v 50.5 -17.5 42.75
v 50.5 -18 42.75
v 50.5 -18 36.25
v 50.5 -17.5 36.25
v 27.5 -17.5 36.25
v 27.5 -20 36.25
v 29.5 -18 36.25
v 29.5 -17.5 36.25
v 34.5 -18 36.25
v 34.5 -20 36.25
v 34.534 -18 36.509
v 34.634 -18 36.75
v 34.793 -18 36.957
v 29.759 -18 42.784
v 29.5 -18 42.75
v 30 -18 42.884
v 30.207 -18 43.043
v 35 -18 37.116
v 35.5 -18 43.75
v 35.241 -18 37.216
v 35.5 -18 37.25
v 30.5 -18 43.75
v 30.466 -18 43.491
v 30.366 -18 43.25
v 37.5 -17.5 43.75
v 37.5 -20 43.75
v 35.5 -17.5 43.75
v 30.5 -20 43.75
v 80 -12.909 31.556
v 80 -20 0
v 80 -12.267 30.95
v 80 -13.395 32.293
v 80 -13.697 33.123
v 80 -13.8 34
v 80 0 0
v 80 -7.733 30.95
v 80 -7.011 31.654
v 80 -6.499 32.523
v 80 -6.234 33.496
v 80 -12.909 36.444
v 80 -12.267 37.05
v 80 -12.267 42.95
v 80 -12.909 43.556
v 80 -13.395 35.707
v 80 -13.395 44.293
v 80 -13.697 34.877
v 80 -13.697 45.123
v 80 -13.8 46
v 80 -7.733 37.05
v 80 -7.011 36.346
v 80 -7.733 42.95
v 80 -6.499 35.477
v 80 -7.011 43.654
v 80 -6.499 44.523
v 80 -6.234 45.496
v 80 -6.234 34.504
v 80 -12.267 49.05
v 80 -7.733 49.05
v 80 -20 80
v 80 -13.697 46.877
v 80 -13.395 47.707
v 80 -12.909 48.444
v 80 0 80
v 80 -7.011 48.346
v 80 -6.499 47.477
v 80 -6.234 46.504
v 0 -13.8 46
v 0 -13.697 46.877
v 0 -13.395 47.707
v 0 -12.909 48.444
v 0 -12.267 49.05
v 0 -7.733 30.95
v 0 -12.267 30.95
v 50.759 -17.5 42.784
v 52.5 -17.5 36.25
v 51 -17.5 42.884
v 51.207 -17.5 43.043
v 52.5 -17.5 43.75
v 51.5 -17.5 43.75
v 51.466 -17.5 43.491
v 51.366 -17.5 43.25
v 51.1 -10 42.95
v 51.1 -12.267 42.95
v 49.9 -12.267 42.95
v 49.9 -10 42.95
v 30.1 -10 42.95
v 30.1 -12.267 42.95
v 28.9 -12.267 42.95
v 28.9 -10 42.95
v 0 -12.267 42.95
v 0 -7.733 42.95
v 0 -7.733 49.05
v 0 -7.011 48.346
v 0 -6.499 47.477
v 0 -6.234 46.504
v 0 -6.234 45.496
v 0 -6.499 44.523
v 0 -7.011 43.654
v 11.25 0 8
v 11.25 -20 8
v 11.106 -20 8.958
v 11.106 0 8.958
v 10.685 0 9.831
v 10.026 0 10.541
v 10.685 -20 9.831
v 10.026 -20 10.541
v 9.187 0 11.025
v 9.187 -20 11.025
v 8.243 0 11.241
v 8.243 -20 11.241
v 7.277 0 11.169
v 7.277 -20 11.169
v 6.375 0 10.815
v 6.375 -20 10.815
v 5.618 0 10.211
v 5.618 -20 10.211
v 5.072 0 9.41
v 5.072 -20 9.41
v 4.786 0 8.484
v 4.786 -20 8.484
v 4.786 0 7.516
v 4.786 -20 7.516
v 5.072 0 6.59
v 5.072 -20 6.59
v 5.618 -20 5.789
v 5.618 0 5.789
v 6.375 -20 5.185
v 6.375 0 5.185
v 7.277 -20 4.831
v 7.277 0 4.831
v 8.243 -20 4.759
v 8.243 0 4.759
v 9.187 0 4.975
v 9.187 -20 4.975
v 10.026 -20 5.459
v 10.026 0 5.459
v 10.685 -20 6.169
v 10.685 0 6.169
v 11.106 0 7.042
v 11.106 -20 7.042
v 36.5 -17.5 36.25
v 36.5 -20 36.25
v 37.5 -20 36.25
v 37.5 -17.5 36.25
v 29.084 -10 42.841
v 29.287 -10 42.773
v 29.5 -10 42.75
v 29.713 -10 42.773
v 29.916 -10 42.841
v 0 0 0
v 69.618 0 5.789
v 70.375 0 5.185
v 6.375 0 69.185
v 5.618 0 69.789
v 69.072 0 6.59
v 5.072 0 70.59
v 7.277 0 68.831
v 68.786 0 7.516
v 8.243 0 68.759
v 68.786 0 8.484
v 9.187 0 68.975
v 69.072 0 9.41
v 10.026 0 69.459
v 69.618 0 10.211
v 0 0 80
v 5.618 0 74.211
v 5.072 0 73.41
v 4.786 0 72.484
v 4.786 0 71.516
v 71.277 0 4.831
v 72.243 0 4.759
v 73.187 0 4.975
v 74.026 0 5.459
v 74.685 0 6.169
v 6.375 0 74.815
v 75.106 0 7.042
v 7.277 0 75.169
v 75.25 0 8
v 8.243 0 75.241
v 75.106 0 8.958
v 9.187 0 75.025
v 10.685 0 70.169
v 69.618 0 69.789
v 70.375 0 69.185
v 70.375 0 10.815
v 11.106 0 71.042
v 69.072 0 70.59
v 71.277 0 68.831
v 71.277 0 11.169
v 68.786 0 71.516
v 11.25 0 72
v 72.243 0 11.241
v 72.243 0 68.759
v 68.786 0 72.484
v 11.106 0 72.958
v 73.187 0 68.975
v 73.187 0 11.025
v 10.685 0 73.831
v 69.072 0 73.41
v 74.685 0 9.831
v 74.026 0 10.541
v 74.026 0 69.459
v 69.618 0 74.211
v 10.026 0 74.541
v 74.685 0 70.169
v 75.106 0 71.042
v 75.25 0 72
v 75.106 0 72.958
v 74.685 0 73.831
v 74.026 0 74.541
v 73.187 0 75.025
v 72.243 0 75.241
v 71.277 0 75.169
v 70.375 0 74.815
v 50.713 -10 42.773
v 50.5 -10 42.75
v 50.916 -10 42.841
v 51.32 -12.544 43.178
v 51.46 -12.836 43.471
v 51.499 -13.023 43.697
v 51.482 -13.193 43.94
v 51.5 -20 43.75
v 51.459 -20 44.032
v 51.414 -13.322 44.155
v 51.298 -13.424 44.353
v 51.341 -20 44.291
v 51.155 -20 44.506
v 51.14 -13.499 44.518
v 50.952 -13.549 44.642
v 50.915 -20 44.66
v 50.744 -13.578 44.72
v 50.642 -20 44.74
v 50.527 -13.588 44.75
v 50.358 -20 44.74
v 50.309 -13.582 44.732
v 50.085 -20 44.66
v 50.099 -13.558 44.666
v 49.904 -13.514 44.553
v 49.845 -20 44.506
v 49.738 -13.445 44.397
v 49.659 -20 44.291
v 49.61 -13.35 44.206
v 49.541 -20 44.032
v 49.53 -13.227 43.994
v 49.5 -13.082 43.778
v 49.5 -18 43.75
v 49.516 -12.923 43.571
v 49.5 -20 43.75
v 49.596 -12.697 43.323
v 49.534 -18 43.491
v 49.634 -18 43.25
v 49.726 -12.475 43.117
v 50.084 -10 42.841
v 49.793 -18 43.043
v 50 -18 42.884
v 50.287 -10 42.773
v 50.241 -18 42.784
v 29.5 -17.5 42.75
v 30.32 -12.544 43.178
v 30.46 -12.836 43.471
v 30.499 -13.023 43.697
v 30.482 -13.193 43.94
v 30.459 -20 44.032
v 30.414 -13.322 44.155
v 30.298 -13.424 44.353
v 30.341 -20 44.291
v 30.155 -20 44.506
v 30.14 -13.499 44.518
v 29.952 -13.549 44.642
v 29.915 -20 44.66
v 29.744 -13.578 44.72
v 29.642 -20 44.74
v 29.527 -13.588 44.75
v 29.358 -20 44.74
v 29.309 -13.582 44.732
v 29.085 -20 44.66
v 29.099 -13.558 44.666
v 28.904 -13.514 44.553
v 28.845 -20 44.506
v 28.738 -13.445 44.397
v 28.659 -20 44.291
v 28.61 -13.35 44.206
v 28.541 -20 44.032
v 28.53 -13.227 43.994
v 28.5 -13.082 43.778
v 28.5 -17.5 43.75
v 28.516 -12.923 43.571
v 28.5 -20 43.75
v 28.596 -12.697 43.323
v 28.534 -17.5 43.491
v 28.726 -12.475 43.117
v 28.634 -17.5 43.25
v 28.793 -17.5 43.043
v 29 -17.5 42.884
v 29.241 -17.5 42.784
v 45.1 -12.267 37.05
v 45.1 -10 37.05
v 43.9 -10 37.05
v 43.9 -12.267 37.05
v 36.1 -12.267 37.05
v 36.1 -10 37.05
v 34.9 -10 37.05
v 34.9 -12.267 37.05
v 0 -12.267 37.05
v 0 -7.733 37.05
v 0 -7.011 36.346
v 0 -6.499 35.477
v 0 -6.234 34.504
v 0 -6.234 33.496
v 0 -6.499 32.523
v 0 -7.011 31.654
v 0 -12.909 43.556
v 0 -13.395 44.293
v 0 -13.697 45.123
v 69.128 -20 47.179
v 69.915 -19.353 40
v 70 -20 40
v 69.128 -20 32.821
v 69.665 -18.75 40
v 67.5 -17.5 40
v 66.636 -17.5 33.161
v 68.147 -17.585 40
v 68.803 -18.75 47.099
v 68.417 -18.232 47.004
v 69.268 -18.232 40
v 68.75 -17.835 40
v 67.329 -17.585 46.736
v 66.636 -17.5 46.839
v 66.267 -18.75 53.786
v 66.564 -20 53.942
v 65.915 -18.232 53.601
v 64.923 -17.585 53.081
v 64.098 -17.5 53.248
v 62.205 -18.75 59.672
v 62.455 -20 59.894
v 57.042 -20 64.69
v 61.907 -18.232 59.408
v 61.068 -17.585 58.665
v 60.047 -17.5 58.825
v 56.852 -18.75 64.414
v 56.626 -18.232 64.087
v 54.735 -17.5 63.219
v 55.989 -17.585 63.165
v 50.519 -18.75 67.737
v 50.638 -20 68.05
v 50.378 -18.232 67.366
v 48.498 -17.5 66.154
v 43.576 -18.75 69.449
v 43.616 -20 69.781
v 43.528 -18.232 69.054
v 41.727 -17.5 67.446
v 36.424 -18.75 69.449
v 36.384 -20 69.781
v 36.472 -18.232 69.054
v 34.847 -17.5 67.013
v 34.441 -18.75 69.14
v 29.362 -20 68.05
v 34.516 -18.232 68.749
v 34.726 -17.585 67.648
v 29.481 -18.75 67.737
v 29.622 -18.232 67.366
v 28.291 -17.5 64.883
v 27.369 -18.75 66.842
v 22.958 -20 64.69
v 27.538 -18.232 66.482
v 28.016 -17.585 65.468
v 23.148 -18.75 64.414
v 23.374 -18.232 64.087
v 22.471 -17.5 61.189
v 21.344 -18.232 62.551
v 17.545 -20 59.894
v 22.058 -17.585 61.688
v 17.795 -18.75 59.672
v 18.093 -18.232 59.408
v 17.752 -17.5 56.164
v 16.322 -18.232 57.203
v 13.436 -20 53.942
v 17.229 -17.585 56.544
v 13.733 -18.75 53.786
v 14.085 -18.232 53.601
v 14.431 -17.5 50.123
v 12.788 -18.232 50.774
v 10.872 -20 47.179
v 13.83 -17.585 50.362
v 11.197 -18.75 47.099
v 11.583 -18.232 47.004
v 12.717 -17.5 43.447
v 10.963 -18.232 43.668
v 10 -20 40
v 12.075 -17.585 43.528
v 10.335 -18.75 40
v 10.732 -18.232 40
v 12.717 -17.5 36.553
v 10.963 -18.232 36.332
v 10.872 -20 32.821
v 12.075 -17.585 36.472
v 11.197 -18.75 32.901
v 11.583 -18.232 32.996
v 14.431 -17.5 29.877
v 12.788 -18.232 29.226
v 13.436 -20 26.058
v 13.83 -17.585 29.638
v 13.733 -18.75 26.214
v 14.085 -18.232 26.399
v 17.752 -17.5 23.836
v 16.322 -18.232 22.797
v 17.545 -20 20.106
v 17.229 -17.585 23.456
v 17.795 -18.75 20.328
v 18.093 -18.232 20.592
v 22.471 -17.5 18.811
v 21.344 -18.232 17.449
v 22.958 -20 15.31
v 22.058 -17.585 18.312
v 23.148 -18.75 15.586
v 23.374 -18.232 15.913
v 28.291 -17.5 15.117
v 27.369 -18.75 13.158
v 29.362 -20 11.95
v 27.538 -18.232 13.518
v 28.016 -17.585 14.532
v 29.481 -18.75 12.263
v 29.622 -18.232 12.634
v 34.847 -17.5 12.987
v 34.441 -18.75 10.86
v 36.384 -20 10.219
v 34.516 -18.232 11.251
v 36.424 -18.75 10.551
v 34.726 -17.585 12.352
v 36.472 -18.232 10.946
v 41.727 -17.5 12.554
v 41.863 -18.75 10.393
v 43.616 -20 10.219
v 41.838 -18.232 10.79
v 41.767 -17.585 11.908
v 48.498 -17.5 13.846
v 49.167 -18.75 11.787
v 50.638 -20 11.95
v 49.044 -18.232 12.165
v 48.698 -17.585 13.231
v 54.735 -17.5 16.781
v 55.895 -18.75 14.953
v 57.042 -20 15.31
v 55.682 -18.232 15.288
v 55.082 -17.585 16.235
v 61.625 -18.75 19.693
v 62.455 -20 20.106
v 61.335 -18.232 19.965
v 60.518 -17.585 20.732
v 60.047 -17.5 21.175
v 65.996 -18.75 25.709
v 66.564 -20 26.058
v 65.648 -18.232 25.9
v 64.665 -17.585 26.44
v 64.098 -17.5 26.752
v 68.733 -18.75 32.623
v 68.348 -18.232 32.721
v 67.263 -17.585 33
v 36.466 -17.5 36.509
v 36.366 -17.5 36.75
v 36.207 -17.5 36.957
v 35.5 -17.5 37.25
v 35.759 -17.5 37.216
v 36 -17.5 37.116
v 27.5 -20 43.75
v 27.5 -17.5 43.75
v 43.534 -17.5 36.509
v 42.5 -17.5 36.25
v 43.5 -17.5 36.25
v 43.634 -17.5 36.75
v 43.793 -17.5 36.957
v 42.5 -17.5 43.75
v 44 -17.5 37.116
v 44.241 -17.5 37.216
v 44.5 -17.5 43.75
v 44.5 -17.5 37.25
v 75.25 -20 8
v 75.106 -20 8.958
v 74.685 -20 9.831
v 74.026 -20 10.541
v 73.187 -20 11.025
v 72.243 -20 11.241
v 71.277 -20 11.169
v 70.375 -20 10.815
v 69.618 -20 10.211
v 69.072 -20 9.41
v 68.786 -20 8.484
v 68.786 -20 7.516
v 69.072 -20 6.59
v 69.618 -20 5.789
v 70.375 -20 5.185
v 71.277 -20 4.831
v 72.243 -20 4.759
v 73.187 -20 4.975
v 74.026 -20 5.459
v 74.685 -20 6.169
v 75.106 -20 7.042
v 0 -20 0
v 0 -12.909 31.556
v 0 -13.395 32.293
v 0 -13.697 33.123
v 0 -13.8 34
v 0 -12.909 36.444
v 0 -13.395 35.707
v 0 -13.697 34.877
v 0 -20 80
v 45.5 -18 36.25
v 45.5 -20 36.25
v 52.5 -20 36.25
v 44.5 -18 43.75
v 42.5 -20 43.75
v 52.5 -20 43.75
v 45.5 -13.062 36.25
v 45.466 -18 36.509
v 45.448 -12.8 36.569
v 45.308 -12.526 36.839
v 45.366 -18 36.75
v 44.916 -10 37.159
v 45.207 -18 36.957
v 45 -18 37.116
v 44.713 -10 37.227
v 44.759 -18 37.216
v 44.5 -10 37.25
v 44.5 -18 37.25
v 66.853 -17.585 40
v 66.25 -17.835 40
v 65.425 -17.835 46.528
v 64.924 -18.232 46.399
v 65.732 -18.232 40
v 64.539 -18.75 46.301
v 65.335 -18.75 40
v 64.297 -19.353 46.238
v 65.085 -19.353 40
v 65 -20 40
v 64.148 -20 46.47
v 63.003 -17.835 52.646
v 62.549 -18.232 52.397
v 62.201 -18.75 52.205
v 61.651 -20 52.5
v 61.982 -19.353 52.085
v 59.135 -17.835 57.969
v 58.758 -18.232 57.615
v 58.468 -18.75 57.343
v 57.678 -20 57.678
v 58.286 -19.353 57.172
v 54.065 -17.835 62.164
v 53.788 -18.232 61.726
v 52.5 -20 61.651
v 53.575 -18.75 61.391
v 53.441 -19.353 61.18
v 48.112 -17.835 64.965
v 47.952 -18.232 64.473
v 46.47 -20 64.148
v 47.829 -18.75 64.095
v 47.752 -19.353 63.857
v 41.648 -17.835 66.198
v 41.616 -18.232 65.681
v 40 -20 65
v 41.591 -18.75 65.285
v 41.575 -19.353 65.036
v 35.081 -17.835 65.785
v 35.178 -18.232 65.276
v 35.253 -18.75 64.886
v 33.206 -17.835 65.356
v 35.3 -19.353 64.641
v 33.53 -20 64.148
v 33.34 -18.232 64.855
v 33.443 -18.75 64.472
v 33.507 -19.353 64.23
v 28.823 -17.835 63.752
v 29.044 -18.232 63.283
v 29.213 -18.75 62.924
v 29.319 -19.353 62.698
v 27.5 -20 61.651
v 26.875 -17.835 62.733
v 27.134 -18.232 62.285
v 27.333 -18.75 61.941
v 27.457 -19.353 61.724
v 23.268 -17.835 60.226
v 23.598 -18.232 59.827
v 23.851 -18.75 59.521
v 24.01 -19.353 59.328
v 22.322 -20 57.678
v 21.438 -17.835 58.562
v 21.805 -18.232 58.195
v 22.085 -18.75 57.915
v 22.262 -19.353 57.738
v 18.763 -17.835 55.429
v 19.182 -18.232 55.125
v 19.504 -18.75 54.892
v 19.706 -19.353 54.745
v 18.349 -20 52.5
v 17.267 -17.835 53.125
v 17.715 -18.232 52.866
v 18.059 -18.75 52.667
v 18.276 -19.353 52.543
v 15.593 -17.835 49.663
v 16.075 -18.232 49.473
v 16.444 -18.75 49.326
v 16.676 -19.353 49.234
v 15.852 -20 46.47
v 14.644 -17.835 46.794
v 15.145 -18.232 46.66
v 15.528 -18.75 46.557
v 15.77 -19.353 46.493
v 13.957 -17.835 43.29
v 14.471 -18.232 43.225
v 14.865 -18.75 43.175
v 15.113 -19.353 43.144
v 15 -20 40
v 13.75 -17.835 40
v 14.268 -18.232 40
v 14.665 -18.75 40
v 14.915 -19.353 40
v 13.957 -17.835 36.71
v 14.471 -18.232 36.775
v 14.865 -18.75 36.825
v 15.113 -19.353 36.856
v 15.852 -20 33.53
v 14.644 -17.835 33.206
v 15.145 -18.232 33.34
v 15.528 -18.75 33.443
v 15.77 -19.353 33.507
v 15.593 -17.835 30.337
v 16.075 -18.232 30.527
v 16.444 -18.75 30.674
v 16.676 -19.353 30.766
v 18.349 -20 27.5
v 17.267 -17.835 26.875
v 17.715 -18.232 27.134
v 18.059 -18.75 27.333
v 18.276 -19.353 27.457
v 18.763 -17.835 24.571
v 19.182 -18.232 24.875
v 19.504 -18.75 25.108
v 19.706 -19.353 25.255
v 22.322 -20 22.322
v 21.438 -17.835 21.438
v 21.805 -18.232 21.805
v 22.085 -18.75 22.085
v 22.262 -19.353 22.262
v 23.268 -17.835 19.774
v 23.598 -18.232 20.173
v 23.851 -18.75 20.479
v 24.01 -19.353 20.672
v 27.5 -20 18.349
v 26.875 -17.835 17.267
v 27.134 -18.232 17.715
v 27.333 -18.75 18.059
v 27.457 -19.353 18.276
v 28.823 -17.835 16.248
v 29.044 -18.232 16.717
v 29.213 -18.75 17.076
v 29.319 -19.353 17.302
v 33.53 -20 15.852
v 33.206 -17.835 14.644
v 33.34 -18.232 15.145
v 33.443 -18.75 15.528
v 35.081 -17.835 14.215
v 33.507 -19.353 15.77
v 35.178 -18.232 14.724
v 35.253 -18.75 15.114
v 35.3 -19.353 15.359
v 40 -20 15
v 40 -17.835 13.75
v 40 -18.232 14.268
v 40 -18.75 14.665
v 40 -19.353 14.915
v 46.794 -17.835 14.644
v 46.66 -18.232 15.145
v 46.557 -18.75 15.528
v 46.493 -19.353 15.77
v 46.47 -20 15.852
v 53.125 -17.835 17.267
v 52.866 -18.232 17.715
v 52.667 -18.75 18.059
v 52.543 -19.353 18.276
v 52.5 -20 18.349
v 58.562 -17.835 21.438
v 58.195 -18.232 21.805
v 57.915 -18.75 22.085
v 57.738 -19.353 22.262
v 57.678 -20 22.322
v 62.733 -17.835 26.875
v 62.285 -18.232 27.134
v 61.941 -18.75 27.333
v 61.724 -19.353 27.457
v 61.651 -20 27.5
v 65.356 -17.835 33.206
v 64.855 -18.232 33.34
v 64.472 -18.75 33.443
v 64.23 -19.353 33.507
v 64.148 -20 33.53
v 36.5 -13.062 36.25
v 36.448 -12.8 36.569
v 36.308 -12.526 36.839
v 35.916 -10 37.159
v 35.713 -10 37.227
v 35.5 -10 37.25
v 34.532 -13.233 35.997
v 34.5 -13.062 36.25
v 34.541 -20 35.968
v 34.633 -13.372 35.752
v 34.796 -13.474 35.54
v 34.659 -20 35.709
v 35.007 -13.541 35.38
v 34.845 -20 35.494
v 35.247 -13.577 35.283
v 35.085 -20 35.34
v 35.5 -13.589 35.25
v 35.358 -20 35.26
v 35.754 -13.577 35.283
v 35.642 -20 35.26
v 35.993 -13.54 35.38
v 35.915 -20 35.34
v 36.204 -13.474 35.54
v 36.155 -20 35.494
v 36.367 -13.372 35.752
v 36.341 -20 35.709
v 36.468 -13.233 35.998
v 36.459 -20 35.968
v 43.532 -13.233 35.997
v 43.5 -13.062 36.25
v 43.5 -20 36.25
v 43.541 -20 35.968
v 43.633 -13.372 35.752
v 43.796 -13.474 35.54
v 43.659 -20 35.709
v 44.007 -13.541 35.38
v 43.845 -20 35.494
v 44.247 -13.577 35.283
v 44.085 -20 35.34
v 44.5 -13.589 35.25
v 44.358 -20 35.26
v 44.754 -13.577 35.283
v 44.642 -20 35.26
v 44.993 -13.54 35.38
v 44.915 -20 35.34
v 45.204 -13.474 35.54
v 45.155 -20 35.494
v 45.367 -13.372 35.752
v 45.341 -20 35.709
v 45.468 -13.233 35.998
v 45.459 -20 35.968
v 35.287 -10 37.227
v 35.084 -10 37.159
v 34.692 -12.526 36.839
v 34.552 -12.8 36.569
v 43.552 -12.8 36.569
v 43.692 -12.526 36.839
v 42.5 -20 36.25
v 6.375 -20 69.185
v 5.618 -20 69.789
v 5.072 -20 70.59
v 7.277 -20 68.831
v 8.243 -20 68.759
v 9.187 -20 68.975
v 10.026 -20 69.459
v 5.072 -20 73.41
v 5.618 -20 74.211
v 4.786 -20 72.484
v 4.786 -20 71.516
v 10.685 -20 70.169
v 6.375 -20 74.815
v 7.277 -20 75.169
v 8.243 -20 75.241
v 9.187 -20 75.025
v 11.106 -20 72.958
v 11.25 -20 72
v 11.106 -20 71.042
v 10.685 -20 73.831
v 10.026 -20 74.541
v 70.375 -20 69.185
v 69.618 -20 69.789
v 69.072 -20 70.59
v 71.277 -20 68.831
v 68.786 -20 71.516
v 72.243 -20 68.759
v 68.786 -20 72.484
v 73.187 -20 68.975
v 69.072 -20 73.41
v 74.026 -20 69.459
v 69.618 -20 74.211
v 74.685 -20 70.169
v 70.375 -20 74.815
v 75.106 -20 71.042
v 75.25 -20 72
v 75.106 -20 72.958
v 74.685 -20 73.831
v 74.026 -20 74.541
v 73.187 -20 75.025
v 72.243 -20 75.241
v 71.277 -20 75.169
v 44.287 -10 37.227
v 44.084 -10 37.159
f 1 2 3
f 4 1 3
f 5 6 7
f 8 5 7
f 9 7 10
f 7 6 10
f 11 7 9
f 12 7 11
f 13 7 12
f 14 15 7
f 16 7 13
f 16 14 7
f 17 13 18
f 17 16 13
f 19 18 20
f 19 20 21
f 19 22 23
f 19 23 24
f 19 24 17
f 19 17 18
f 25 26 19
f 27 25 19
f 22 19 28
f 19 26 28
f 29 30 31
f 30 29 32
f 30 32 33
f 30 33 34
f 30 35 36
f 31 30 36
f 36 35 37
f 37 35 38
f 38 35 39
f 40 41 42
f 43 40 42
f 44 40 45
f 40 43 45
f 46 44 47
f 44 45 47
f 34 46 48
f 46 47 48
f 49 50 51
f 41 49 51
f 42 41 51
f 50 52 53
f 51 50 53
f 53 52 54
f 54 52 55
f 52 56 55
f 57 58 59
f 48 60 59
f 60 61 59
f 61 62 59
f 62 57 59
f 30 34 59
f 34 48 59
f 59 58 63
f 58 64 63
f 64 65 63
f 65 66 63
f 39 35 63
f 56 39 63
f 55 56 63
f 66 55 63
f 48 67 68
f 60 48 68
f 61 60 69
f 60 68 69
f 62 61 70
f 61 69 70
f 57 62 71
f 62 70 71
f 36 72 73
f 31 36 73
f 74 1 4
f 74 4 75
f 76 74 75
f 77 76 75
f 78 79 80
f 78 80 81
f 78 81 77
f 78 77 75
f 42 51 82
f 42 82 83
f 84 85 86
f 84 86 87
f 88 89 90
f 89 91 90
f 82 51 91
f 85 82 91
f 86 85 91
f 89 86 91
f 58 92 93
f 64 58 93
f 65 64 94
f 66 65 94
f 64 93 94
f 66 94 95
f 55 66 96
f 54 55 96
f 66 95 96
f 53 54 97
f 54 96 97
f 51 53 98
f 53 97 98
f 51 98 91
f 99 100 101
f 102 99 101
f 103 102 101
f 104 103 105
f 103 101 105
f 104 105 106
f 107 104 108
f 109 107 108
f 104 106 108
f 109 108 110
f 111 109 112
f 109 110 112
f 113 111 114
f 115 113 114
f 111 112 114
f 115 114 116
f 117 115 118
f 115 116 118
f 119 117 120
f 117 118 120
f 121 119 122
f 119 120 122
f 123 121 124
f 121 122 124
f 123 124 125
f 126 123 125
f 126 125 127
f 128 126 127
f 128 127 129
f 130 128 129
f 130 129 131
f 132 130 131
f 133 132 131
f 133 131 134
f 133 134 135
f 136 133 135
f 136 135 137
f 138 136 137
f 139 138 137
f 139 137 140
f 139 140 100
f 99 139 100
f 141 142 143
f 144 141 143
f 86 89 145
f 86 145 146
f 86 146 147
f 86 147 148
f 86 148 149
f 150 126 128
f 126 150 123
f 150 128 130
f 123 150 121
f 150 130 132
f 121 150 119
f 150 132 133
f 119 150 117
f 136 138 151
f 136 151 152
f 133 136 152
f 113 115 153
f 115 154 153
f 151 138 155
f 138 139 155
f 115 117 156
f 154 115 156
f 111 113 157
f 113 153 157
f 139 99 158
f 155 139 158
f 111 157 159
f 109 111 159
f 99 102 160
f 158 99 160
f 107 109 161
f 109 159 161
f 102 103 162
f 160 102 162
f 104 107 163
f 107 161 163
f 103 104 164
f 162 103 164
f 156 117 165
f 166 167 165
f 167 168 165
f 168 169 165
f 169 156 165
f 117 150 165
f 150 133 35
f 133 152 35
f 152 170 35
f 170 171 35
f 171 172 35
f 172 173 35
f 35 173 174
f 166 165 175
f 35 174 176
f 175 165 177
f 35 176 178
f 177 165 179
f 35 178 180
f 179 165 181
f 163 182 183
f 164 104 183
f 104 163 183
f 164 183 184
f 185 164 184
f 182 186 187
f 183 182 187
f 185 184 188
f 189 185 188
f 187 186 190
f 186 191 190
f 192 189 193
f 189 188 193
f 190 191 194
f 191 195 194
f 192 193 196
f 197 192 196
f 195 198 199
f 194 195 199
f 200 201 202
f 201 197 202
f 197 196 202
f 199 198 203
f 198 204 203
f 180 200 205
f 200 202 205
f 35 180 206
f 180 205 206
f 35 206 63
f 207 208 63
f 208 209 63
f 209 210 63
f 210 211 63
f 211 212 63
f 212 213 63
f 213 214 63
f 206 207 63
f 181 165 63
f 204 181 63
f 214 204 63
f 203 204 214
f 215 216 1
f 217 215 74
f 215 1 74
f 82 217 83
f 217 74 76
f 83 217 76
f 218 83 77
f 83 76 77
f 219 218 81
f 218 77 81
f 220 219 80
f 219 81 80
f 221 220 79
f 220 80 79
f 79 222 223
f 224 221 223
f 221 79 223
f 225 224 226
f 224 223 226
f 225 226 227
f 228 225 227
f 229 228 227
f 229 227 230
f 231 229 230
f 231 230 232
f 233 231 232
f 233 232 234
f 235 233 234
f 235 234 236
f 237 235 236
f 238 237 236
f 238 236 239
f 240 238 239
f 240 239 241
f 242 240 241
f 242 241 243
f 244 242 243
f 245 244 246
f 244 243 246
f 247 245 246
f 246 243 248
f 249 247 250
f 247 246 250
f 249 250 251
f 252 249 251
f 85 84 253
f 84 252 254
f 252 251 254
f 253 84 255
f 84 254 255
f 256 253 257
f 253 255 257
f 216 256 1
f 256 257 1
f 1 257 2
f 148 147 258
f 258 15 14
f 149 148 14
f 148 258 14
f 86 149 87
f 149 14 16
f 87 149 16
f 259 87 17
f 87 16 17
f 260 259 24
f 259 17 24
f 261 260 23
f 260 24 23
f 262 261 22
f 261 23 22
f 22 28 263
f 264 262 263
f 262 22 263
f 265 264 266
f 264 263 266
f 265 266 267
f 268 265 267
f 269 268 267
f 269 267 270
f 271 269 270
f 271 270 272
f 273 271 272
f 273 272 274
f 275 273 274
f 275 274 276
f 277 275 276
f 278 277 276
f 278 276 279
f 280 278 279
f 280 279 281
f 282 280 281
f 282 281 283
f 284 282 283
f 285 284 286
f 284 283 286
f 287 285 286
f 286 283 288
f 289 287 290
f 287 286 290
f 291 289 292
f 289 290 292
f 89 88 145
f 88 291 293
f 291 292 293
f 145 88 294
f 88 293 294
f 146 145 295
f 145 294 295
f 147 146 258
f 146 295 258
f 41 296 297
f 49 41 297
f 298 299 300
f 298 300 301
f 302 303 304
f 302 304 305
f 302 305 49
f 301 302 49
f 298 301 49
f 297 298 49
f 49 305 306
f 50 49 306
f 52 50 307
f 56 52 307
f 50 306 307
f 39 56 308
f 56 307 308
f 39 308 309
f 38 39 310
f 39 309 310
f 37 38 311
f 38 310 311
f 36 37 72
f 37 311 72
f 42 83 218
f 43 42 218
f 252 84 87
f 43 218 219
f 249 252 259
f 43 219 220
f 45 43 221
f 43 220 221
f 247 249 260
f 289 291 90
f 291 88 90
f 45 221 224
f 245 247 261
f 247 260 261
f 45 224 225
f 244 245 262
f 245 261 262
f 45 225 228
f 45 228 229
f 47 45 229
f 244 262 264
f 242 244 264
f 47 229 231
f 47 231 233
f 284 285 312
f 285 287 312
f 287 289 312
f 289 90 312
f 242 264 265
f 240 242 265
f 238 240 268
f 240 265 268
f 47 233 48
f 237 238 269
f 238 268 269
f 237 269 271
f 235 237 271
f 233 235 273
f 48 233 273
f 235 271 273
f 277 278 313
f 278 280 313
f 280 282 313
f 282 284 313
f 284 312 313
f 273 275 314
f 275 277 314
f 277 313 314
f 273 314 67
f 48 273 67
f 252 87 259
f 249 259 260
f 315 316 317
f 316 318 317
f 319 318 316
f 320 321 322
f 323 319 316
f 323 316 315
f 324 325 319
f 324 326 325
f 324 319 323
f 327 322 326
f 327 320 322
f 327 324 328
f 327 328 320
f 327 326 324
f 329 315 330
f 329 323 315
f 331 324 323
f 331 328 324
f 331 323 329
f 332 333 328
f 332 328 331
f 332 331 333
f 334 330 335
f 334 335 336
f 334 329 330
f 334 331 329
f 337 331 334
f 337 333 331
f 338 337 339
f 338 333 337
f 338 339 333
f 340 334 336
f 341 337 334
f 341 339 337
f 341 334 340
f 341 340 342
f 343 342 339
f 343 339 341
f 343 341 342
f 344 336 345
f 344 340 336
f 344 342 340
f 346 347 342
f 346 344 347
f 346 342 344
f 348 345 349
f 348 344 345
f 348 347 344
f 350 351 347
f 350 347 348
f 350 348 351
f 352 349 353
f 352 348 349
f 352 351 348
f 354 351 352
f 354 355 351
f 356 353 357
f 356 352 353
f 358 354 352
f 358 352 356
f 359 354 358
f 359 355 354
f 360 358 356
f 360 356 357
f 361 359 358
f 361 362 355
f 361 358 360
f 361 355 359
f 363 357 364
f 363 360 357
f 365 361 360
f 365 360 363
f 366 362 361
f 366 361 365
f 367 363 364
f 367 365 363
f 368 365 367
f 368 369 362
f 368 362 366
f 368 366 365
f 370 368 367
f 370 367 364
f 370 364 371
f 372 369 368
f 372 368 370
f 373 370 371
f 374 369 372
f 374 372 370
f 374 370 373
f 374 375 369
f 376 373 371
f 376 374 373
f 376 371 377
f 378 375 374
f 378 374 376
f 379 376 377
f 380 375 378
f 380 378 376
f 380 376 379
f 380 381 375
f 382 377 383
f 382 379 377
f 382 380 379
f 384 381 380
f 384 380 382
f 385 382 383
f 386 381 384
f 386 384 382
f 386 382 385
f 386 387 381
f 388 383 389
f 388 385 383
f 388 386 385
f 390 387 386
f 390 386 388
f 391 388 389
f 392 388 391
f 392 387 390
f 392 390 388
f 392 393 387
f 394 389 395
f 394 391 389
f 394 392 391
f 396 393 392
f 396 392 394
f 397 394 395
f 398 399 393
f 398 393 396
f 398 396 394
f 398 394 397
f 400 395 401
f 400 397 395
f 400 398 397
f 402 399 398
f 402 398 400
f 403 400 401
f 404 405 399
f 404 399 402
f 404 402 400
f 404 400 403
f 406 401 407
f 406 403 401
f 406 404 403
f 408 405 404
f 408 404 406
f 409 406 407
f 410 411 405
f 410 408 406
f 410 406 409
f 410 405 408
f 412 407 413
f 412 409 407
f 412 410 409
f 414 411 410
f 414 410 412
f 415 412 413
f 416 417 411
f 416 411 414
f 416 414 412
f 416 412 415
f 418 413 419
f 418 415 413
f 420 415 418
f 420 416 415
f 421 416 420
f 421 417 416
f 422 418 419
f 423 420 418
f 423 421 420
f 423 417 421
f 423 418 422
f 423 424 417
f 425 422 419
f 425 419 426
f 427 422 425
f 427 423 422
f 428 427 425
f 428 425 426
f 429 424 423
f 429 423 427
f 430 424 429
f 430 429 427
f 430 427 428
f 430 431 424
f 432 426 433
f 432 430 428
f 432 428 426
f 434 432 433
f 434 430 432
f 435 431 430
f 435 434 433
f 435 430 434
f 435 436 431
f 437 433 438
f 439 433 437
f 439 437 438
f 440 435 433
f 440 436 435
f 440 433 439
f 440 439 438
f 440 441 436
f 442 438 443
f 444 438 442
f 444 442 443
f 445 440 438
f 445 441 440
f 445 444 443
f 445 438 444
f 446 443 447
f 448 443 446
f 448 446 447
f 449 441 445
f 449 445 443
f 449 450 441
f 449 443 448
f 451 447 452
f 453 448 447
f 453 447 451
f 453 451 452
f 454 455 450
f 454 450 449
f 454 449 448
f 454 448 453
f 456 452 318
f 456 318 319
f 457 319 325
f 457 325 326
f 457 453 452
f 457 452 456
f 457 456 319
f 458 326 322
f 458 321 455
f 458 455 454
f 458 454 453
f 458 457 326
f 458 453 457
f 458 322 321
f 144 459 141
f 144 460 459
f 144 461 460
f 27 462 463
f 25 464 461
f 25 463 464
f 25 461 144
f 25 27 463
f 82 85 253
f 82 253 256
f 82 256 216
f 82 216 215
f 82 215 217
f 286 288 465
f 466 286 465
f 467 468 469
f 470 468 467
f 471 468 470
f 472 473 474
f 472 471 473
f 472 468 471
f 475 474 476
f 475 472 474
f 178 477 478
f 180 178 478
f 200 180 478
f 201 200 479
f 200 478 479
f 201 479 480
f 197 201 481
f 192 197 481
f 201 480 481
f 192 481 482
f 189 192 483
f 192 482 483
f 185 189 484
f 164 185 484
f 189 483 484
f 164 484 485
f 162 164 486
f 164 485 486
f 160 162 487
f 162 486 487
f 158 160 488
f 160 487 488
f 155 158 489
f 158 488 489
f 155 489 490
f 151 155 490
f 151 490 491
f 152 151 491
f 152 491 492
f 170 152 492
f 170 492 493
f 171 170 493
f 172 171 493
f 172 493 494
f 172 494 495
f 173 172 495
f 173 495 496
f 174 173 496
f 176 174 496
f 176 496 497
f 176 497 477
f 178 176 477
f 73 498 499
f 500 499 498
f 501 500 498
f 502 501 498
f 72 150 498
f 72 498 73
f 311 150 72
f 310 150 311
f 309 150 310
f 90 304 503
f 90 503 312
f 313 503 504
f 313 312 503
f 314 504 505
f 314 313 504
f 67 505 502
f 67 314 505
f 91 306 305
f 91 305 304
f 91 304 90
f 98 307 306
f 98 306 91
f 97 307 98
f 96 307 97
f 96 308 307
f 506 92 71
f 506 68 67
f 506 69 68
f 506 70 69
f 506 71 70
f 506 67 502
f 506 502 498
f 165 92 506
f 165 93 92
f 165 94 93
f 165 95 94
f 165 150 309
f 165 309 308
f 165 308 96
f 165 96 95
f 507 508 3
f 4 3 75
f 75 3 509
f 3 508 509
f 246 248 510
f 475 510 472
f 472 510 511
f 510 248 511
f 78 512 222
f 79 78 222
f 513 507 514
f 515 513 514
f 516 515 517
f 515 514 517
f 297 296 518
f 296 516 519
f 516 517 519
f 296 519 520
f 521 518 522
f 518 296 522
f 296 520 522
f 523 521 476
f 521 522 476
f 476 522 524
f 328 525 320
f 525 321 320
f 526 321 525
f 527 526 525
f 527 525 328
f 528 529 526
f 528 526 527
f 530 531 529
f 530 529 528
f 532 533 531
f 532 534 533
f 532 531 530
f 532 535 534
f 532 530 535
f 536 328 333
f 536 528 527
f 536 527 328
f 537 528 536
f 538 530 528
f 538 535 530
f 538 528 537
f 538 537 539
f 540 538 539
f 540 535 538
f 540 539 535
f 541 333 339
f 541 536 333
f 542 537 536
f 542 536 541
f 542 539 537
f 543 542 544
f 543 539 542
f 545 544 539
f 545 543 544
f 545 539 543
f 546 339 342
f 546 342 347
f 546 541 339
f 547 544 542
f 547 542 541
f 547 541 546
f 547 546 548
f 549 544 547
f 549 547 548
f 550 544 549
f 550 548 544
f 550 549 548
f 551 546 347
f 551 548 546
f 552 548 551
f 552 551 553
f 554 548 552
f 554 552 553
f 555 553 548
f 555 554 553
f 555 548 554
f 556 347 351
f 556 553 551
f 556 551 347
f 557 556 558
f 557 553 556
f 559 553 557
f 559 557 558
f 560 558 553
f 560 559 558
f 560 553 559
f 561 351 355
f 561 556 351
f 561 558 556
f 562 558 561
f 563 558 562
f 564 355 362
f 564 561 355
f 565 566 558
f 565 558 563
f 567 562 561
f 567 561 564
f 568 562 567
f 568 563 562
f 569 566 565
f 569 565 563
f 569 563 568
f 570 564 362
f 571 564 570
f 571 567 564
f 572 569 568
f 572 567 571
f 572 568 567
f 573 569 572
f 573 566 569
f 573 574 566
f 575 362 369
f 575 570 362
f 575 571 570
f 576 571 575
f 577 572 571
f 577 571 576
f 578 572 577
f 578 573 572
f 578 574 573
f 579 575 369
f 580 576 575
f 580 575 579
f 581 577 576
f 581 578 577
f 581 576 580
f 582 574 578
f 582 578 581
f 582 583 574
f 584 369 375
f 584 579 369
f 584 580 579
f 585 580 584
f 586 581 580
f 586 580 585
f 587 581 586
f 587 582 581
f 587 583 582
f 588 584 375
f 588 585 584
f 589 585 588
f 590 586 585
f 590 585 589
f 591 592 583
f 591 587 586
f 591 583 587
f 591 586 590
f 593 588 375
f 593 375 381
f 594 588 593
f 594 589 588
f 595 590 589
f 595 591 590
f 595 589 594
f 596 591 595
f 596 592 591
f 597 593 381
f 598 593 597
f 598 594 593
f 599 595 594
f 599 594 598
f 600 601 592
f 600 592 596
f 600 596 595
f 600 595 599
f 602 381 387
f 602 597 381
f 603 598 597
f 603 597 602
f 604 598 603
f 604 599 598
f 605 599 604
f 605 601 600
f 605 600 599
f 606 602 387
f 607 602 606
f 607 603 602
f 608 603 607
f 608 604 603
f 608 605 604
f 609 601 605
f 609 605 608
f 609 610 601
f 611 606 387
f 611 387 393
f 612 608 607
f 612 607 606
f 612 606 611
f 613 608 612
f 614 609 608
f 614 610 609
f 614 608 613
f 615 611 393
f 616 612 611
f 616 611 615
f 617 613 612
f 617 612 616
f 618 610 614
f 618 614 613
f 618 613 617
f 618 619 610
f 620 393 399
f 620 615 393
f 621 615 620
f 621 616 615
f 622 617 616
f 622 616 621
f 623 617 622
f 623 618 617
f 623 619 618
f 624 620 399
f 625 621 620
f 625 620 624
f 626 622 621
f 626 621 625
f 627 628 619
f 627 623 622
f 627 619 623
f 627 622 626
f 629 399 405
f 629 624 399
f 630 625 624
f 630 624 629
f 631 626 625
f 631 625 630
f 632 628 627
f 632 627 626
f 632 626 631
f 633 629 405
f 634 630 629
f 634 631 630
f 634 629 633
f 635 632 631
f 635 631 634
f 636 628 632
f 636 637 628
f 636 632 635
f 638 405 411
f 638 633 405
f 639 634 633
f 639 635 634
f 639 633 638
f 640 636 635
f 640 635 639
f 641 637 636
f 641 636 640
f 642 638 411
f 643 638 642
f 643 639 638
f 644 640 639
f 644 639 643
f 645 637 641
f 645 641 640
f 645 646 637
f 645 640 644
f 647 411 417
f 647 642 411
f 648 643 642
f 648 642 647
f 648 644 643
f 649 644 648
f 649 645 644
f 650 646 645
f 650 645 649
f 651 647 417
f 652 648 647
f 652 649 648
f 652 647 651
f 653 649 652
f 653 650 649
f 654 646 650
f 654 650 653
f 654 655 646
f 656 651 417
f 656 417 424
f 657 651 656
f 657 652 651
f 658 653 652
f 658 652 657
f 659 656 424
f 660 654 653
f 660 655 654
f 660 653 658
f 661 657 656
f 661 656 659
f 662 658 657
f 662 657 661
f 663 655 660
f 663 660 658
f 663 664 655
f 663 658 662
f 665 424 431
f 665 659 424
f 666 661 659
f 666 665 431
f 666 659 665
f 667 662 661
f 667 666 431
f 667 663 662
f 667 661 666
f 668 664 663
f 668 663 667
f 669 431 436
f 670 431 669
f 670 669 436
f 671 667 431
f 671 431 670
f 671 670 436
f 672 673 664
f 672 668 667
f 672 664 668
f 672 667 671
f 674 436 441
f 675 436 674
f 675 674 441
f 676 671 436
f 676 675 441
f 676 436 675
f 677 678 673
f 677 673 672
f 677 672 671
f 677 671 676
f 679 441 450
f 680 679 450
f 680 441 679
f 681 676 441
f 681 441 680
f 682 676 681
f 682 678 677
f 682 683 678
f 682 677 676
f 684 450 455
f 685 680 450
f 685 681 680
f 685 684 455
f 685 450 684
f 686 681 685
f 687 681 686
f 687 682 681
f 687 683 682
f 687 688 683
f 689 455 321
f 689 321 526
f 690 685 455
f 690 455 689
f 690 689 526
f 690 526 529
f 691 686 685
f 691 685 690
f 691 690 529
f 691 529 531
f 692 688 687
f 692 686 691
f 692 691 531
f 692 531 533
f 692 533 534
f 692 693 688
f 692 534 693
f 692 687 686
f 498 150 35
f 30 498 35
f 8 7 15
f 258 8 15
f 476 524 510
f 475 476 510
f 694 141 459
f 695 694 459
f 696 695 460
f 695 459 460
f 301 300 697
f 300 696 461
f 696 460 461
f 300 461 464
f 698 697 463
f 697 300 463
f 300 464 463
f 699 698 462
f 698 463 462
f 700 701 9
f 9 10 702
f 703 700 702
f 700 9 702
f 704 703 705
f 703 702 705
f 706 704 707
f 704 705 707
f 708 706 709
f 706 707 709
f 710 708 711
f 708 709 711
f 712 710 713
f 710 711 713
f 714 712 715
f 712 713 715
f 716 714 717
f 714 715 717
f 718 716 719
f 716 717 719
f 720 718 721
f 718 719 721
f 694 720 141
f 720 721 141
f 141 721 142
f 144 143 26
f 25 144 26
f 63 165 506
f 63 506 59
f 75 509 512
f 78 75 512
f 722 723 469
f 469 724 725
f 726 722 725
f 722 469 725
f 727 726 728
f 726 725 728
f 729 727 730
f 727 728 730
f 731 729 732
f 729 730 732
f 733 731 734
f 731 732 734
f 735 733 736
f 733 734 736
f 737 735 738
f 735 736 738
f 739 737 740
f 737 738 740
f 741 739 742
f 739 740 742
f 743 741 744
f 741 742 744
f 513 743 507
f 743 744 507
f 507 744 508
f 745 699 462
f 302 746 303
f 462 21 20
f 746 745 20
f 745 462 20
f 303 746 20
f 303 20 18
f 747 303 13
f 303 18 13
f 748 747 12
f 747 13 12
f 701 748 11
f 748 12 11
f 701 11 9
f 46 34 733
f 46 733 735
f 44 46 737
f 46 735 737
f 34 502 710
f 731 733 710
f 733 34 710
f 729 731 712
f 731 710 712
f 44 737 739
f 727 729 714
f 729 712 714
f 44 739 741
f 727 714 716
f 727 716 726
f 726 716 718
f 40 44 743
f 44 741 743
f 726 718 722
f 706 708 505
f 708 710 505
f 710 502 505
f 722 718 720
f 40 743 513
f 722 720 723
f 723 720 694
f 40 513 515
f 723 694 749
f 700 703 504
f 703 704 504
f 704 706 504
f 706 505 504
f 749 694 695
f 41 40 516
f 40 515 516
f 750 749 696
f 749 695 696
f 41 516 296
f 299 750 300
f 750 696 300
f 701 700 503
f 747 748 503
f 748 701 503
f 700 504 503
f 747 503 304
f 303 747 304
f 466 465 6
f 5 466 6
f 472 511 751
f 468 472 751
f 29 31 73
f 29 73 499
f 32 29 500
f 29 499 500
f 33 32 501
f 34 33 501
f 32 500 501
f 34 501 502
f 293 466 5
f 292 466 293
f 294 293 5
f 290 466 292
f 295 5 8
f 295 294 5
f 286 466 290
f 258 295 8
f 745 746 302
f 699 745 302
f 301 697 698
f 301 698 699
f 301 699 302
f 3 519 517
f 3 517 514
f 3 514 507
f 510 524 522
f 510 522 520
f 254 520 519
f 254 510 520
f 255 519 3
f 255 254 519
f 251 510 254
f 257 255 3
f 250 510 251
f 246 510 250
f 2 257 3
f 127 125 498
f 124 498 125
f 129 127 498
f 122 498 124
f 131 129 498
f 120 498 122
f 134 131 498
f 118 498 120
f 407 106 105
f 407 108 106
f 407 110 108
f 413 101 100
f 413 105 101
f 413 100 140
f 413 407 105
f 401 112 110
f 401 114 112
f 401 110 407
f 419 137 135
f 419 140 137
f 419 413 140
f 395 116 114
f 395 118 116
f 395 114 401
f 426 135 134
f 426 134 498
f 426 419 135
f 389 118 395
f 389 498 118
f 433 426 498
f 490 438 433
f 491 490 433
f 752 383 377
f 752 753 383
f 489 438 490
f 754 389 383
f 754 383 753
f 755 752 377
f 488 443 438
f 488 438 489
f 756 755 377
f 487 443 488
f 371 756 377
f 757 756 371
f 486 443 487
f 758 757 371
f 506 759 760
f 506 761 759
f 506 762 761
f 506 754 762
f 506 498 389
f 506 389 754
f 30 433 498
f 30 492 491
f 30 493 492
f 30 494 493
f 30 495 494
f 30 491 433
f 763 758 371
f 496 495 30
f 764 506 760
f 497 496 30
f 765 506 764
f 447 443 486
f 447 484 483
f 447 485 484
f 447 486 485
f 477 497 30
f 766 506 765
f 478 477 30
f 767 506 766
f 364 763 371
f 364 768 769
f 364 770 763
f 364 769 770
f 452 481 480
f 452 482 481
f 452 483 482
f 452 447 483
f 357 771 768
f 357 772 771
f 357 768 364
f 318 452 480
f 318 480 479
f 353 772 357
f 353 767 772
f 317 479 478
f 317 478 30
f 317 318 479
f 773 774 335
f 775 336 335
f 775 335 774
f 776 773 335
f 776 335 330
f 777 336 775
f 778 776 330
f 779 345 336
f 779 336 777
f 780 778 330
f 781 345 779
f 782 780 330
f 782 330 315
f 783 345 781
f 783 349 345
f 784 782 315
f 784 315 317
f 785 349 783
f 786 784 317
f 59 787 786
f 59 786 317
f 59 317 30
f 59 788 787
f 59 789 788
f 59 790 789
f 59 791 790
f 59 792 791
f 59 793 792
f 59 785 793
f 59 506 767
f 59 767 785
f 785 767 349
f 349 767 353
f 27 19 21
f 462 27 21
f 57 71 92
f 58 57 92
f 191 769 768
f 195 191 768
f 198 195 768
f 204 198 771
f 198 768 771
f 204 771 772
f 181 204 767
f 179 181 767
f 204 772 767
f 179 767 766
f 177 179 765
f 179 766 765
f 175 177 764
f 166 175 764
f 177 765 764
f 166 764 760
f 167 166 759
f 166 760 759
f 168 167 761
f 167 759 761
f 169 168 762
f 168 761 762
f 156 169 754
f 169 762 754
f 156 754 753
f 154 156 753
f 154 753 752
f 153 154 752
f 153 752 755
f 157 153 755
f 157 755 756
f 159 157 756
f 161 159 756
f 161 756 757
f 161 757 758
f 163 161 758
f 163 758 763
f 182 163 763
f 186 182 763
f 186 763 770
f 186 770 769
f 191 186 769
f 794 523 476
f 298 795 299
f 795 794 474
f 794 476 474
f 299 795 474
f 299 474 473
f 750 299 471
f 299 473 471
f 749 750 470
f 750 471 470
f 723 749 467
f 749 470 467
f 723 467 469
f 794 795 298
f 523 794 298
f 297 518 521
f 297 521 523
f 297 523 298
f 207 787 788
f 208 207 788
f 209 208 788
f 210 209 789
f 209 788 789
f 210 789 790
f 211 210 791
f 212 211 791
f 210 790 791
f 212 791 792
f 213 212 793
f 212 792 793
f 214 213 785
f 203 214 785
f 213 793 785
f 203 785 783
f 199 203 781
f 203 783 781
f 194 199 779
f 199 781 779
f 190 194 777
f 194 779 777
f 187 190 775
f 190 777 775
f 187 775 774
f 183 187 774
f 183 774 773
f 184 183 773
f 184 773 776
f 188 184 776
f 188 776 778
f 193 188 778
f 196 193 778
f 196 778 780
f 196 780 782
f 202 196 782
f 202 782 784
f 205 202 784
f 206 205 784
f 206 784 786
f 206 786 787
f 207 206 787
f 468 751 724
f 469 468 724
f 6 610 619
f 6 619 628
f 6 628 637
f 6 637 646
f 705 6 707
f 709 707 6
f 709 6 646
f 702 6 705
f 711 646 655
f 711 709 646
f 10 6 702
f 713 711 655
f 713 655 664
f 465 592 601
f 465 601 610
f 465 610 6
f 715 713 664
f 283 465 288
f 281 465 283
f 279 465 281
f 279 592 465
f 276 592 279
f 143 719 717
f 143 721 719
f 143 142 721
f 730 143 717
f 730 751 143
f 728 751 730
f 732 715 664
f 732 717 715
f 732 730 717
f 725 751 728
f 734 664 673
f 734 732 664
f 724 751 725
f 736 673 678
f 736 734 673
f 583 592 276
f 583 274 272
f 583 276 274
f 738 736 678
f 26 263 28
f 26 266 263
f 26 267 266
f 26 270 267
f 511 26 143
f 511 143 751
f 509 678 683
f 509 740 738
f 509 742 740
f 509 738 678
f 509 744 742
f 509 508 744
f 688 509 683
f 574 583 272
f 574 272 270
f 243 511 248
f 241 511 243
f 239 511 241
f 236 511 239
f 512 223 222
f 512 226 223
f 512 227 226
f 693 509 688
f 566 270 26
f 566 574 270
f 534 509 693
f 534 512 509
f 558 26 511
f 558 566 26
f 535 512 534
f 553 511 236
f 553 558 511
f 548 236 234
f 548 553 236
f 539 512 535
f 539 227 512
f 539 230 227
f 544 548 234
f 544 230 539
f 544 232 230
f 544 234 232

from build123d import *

# Parameters (mm, degrees)
F1_W      = 80
F1_H      = 80
F2_DEPTH  = 20
F4_R      = 3.25
F5_DEPTH  = 20.001
F4_R_2    = 30
F4_R_3    = 25
F6_DEPTH  = 2.5
F7_R      = 2.49999
F4_W      = 2
F4_H      = 3.75
F9_DEPTH  = 2.5
F10_DEPTH = 10
F12_DEPTH = 80.001
F13_DEPTH = 80.0010001
F14_DEPTH = 2


# Not quite as in the source:
# - two fillets or chamfers of one size are made in one step
# - a fillet or chamfer is up to 0.001 mm smaller than in the source, because OpenCascade refuses the exact size


with BuildPart() as f2:
    # F1 (on Front) → F2 (new body)
    with BuildSketch(Plane.XZ):
        with Locations((40, 40)):
            Rectangle(F1_W, F1_H)
    extrude(amount=F2_DEPTH)

    # F4 (on face) → F5 (cut, through all)
    with BuildSketch(Plane.XZ.offset(20)):
        with Locations((72, 8)):
            Circle(F4_R)
        with Locations((8, 8)):
            Circle(F4_R)
        with Locations((8, 72)):
            Circle(F4_R)
        with Locations((72, 72)):
            Circle(F4_R)
    extrude(amount=-F5_DEPTH, mode=Mode.SUBTRACT)

    # F4 (on face) → F6 (cut)
    with BuildSketch(Plane.XZ.offset(20)):
        with Locations((40, 40)):
            Circle(F4_R_2)
        with Locations((40, 40)):
            Circle(F4_R_3, mode=Mode.SUBTRACT)
    extrude(amount=-F6_DEPTH, mode=Mode.SUBTRACT)

    # F7 (radius 2.5 in the source; OpenCascade refuses exactly that, so slightly less here)
    f7_edges = [f2.edges().sort_by_distance(p)[0] for p in [
        (15, -17.5, 40),
        (10, -17.5, 40),
    ]]
    fillet(f7_edges, radius=F7_R)

    # F4 (on face) → F9 (cut)
    with BuildSketch(Plane.XZ.offset(20)):
        with BuildLine():
            Line((28.5, 43.75), (27.5, 43.75))
            Line((27.5, 43.75), (27.5, 40))
            Line((27.5, 40), (29.5, 40))
            Line((29.5, 40), (29.5, 42.75))
            ThreePointArc((29.5, 42.75), (28.7928932188, 43.0428932188), (28.5, 43.75))
        make_face()
        with Locations((28.5, 38.125)):
            Rectangle(F4_W, F4_H)
        with BuildLine():
            ThreePointArc((30.5, 43.75), (29.5, 44.75), (28.5, 43.75))
            Line((28.5, 43.75), (29.5, 43.75))
            Line((29.5, 43.75), (30.5, 43.75))
        make_face()
        with BuildLine():
            Line((52.5, 40), (52.5, 43.75))
            Line((52.5, 43.75), (51.5, 43.75))
            ThreePointArc((51.5, 43.75), (51.2071067812, 43.0428932188), (50.5, 42.75))
            Line((50.5, 42.75), (50.5, 40))
            Line((50.5, 40), (52.5, 40))
        make_face()
        with BuildLine():
            Line((37.5, 36.25), (37.5, 40))
            Line((37.5, 40), (35.5, 40))
            Line((35.5, 40), (35.5, 37.25))
            ThreePointArc((35.5, 37.25), (36.2071067812, 36.9571067812), (36.5, 36.25))
            Line((36.5, 36.25), (37.5, 36.25))
        make_face()
        with Locations((36.5, 41.875)):
            Rectangle(F4_W, F4_H)
        with Locations((43.5, 41.875)):
            Rectangle(F4_W, F4_H)
        with BuildLine():
            Line((44.5, 40), (42.5, 40))
            Line((42.5, 40), (42.5, 36.25))
            Line((42.5, 36.25), (43.5, 36.25))
            ThreePointArc((43.5, 36.25), (43.7928932188, 36.9571067812), (44.5, 37.25))
            Line((44.5, 37.25), (44.5, 40))
        make_face()
        with Locations((51.5, 38.125)):
            Rectangle(F4_W, F4_H)
        with BuildLine():
            Line((50.5, 43.75), (51.5, 43.75))
            ThreePointArc((51.5, 43.75), (50.5, 44.75), (49.5, 43.75))
            Line((49.5, 43.75), (50.5, 43.75))
        make_face()
        with BuildLine():
            ThreePointArc((36.5, 36.25), (36.2071067812, 36.9571067812), (35.5, 37.25))
            Line((35.5, 37.25), (35.5, 36.25))
            Line((35.5, 36.25), (36.5, 36.25))
        make_face()
        with BuildLine():
            Line((44.5, 36.25), (44.5, 37.25))
            ThreePointArc((44.5, 37.25), (43.7928932188, 36.9571067812), (43.5, 36.25))
            Line((43.5, 36.25), (44.5, 36.25))
        make_face()
    extrude(amount=-F9_DEPTH, mode=Mode.SUBTRACT)

    # F4 (on face) → F10 (cut)
    with BuildSketch(Plane.XZ.offset(20)):
        with BuildLine():
            ThreePointArc((30.5, 43.75), (29.5, 44.75), (28.5, 43.75))
            Line((28.5, 43.75), (29.5, 43.75))
            Line((29.5, 43.75), (30.5, 43.75))
        make_face()
        with BuildLine():
            Line((29.5, 43.75), (28.5, 43.75))
            ThreePointArc((28.5, 43.75), (28.7928932188, 43.0428932188), (29.5, 42.75))
            Line((29.5, 42.75), (29.5, 43.75))
        make_face()
        with BuildLine():
            Line((30.5, 43.75), (29.5, 43.75))
            Line((29.5, 43.75), (29.5, 42.75))
            ThreePointArc((29.5, 42.75), (30.2071067812, 43.0428932188), (30.5, 43.75))
        make_face()
        with BuildLine():
            Line((35.5, 36.25), (35.5, 37.25))
            ThreePointArc((35.5, 37.25), (34.7928932188, 36.9571067812), (34.5, 36.25))
            Line((34.5, 36.25), (35.5, 36.25))
        make_face()
        with BuildLine():
            ThreePointArc((36.5, 36.25), (36.2071067812, 36.9571067812), (35.5, 37.25))
            Line((35.5, 37.25), (35.5, 36.25))
            Line((35.5, 36.25), (36.5, 36.25))
        make_face()
        with BuildLine():
            ThreePointArc((34.5, 36.25), (35.5, 35.25), (36.5, 36.25))
            Line((36.5, 36.25), (35.5, 36.25))
            Line((35.5, 36.25), (34.5, 36.25))
        make_face()
        with BuildLine():
            Line((44.5, 36.25), (44.5, 37.25))
            ThreePointArc((44.5, 37.25), (43.7928932188, 36.9571067812), (43.5, 36.25))
            Line((43.5, 36.25), (44.5, 36.25))
        make_face()
        with BuildLine():
            ThreePointArc((45.5, 36.25), (45.2071067812, 36.9571067812), (44.5, 37.25))
            Line((44.5, 37.25), (44.5, 36.25))
            Line((44.5, 36.25), (45.5, 36.25))
        make_face()
        with BuildLine():
            Line((44.5, 36.25), (43.5, 36.25))
            ThreePointArc((43.5, 36.25), (44.5, 35.25), (45.5, 36.25))
            Line((45.5, 36.25), (44.5, 36.25))
        make_face()
        with BuildLine():
            Line((50.5, 43.75), (51.5, 43.75))
            ThreePointArc((51.5, 43.75), (50.5, 44.75), (49.5, 43.75))
            Line((49.5, 43.75), (50.5, 43.75))
        make_face()
        with BuildLine():
            Line((50.5, 42.75), (50.5, 43.75))
            Line((50.5, 43.75), (49.5, 43.75))
            ThreePointArc((49.5, 43.75), (49.7928932188, 43.0428932188), (50.5, 42.75))
        make_face()
        with BuildLine():
            ThreePointArc((50.5, 42.75), (51.2071067812, 43.0428932188), (51.5, 43.75))
            Line((51.5, 43.75), (50.5, 43.75))
            Line((50.5, 43.75), (50.5, 42.75))
        make_face()
    extrude(amount=-F10_DEPTH, mode=Mode.SUBTRACT)

    # F11 (on face) → F12 (cut, through all)
    with BuildSketch(Plane(origin=(0, 0, 0), x_dir=(0, -1, 0), z_dir=(-1, 0, 0))):
        with BuildLine():
            ThreePointArc((12.2666053913, 42.95), (13.3950773546, 44.293116947), (13.8, 46))
            ThreePointArc((13.8, 46), (13.3950773546, 47.706883053), (12.2666053913, 49.05))
            Line((12.2666053913, 49.05), (7.7333946087, 49.05))
            ThreePointArc((7.7333946087, 49.05), (6.2, 46), (7.7333946087, 42.95))
            Line((7.7333946087, 42.95), (12.2666053913, 42.95))
        make_face()
    extrude(amount=-F12_DEPTH, mode=Mode.SUBTRACT)

    # F11 (on face) → F13 (cut, through all)
    with BuildSketch(Plane(origin=(0, 0, 0), x_dir=(0, -1, 0), z_dir=(-1, 0, 0))):
        with BuildLine():
            ThreePointArc((12.2666053913, 42.95), (13.3950773546, 44.293116947), (13.8, 46))
            ThreePointArc((13.8, 46), (13.3950773546, 47.706883053), (12.2666053913, 49.05))
            Line((12.2666053913, 49.05), (7.7333946087, 49.05))
            ThreePointArc((7.7333946087, 49.05), (6.2, 46), (7.7333946087, 42.95))
            Line((7.7333946087, 42.95), (12.2666053913, 42.95))
        make_face()
        with BuildLine():
            ThreePointArc((12.2666053913, 30.95), (13.3950773546, 32.293116947), (13.8, 34))
            ThreePointArc((13.8, 34), (13.3950773546, 35.706883053), (12.2666053913, 37.05))
            Line((12.2666053913, 37.05), (7.7333946087, 37.05))
            ThreePointArc((7.7333946087, 37.05), (6.2, 34), (7.7333946087, 30.95))
            Line((7.7333946087, 30.95), (12.2666053913, 30.95))
        make_face()
    extrude(amount=-F13_DEPTH, mode=Mode.SUBTRACT)

    # F4 (on face) → F14 (cut)
    with BuildSketch(Plane.XZ.offset(20)):
        with BuildLine():
            Line((29.5, 42.75), (29.5, 40))
            Line((29.5, 40), (35.5, 40))
            Line((35.5, 40), (35.5, 43.75))
            Line((35.5, 43.75), (30.5, 43.75))
            ThreePointArc((30.5, 43.75), (30.2071067812, 43.0428932188), (29.5, 42.75))
        make_face()
        with BuildLine():
            Line((35.5, 40), (29.5, 40))
            Line((29.5, 40), (29.5, 36.25))
            Line((29.5, 36.25), (34.5, 36.25))
            ThreePointArc((34.5, 36.25), (34.7928932188, 36.9571067812), (35.5, 37.25))
            Line((35.5, 37.25), (35.5, 40))
        make_face()
        with BuildLine():
            Line((44.5, 43.75), (44.5, 40))
            Line((44.5, 40), (50.5, 40))
            Line((50.5, 40), (50.5, 42.75))
            ThreePointArc((50.5, 42.75), (49.7928932188, 43.0428932188), (49.5, 43.75))
            Line((49.5, 43.75), (44.5, 43.75))
        make_face()
        with BuildLine():
            Line((50.5, 40), (44.5, 40))
            Line((44.5, 40), (44.5, 37.25))
            ThreePointArc((44.5, 37.25), (45.2071067812, 36.9571067812), (45.5, 36.25))
            Line((45.5, 36.25), (50.5, 36.25))
            Line((50.5, 36.25), (50.5, 40))
        make_face()
    extrude(amount=-F14_DEPTH, mode=Mode.SUBTRACT)


solid = f2.part
